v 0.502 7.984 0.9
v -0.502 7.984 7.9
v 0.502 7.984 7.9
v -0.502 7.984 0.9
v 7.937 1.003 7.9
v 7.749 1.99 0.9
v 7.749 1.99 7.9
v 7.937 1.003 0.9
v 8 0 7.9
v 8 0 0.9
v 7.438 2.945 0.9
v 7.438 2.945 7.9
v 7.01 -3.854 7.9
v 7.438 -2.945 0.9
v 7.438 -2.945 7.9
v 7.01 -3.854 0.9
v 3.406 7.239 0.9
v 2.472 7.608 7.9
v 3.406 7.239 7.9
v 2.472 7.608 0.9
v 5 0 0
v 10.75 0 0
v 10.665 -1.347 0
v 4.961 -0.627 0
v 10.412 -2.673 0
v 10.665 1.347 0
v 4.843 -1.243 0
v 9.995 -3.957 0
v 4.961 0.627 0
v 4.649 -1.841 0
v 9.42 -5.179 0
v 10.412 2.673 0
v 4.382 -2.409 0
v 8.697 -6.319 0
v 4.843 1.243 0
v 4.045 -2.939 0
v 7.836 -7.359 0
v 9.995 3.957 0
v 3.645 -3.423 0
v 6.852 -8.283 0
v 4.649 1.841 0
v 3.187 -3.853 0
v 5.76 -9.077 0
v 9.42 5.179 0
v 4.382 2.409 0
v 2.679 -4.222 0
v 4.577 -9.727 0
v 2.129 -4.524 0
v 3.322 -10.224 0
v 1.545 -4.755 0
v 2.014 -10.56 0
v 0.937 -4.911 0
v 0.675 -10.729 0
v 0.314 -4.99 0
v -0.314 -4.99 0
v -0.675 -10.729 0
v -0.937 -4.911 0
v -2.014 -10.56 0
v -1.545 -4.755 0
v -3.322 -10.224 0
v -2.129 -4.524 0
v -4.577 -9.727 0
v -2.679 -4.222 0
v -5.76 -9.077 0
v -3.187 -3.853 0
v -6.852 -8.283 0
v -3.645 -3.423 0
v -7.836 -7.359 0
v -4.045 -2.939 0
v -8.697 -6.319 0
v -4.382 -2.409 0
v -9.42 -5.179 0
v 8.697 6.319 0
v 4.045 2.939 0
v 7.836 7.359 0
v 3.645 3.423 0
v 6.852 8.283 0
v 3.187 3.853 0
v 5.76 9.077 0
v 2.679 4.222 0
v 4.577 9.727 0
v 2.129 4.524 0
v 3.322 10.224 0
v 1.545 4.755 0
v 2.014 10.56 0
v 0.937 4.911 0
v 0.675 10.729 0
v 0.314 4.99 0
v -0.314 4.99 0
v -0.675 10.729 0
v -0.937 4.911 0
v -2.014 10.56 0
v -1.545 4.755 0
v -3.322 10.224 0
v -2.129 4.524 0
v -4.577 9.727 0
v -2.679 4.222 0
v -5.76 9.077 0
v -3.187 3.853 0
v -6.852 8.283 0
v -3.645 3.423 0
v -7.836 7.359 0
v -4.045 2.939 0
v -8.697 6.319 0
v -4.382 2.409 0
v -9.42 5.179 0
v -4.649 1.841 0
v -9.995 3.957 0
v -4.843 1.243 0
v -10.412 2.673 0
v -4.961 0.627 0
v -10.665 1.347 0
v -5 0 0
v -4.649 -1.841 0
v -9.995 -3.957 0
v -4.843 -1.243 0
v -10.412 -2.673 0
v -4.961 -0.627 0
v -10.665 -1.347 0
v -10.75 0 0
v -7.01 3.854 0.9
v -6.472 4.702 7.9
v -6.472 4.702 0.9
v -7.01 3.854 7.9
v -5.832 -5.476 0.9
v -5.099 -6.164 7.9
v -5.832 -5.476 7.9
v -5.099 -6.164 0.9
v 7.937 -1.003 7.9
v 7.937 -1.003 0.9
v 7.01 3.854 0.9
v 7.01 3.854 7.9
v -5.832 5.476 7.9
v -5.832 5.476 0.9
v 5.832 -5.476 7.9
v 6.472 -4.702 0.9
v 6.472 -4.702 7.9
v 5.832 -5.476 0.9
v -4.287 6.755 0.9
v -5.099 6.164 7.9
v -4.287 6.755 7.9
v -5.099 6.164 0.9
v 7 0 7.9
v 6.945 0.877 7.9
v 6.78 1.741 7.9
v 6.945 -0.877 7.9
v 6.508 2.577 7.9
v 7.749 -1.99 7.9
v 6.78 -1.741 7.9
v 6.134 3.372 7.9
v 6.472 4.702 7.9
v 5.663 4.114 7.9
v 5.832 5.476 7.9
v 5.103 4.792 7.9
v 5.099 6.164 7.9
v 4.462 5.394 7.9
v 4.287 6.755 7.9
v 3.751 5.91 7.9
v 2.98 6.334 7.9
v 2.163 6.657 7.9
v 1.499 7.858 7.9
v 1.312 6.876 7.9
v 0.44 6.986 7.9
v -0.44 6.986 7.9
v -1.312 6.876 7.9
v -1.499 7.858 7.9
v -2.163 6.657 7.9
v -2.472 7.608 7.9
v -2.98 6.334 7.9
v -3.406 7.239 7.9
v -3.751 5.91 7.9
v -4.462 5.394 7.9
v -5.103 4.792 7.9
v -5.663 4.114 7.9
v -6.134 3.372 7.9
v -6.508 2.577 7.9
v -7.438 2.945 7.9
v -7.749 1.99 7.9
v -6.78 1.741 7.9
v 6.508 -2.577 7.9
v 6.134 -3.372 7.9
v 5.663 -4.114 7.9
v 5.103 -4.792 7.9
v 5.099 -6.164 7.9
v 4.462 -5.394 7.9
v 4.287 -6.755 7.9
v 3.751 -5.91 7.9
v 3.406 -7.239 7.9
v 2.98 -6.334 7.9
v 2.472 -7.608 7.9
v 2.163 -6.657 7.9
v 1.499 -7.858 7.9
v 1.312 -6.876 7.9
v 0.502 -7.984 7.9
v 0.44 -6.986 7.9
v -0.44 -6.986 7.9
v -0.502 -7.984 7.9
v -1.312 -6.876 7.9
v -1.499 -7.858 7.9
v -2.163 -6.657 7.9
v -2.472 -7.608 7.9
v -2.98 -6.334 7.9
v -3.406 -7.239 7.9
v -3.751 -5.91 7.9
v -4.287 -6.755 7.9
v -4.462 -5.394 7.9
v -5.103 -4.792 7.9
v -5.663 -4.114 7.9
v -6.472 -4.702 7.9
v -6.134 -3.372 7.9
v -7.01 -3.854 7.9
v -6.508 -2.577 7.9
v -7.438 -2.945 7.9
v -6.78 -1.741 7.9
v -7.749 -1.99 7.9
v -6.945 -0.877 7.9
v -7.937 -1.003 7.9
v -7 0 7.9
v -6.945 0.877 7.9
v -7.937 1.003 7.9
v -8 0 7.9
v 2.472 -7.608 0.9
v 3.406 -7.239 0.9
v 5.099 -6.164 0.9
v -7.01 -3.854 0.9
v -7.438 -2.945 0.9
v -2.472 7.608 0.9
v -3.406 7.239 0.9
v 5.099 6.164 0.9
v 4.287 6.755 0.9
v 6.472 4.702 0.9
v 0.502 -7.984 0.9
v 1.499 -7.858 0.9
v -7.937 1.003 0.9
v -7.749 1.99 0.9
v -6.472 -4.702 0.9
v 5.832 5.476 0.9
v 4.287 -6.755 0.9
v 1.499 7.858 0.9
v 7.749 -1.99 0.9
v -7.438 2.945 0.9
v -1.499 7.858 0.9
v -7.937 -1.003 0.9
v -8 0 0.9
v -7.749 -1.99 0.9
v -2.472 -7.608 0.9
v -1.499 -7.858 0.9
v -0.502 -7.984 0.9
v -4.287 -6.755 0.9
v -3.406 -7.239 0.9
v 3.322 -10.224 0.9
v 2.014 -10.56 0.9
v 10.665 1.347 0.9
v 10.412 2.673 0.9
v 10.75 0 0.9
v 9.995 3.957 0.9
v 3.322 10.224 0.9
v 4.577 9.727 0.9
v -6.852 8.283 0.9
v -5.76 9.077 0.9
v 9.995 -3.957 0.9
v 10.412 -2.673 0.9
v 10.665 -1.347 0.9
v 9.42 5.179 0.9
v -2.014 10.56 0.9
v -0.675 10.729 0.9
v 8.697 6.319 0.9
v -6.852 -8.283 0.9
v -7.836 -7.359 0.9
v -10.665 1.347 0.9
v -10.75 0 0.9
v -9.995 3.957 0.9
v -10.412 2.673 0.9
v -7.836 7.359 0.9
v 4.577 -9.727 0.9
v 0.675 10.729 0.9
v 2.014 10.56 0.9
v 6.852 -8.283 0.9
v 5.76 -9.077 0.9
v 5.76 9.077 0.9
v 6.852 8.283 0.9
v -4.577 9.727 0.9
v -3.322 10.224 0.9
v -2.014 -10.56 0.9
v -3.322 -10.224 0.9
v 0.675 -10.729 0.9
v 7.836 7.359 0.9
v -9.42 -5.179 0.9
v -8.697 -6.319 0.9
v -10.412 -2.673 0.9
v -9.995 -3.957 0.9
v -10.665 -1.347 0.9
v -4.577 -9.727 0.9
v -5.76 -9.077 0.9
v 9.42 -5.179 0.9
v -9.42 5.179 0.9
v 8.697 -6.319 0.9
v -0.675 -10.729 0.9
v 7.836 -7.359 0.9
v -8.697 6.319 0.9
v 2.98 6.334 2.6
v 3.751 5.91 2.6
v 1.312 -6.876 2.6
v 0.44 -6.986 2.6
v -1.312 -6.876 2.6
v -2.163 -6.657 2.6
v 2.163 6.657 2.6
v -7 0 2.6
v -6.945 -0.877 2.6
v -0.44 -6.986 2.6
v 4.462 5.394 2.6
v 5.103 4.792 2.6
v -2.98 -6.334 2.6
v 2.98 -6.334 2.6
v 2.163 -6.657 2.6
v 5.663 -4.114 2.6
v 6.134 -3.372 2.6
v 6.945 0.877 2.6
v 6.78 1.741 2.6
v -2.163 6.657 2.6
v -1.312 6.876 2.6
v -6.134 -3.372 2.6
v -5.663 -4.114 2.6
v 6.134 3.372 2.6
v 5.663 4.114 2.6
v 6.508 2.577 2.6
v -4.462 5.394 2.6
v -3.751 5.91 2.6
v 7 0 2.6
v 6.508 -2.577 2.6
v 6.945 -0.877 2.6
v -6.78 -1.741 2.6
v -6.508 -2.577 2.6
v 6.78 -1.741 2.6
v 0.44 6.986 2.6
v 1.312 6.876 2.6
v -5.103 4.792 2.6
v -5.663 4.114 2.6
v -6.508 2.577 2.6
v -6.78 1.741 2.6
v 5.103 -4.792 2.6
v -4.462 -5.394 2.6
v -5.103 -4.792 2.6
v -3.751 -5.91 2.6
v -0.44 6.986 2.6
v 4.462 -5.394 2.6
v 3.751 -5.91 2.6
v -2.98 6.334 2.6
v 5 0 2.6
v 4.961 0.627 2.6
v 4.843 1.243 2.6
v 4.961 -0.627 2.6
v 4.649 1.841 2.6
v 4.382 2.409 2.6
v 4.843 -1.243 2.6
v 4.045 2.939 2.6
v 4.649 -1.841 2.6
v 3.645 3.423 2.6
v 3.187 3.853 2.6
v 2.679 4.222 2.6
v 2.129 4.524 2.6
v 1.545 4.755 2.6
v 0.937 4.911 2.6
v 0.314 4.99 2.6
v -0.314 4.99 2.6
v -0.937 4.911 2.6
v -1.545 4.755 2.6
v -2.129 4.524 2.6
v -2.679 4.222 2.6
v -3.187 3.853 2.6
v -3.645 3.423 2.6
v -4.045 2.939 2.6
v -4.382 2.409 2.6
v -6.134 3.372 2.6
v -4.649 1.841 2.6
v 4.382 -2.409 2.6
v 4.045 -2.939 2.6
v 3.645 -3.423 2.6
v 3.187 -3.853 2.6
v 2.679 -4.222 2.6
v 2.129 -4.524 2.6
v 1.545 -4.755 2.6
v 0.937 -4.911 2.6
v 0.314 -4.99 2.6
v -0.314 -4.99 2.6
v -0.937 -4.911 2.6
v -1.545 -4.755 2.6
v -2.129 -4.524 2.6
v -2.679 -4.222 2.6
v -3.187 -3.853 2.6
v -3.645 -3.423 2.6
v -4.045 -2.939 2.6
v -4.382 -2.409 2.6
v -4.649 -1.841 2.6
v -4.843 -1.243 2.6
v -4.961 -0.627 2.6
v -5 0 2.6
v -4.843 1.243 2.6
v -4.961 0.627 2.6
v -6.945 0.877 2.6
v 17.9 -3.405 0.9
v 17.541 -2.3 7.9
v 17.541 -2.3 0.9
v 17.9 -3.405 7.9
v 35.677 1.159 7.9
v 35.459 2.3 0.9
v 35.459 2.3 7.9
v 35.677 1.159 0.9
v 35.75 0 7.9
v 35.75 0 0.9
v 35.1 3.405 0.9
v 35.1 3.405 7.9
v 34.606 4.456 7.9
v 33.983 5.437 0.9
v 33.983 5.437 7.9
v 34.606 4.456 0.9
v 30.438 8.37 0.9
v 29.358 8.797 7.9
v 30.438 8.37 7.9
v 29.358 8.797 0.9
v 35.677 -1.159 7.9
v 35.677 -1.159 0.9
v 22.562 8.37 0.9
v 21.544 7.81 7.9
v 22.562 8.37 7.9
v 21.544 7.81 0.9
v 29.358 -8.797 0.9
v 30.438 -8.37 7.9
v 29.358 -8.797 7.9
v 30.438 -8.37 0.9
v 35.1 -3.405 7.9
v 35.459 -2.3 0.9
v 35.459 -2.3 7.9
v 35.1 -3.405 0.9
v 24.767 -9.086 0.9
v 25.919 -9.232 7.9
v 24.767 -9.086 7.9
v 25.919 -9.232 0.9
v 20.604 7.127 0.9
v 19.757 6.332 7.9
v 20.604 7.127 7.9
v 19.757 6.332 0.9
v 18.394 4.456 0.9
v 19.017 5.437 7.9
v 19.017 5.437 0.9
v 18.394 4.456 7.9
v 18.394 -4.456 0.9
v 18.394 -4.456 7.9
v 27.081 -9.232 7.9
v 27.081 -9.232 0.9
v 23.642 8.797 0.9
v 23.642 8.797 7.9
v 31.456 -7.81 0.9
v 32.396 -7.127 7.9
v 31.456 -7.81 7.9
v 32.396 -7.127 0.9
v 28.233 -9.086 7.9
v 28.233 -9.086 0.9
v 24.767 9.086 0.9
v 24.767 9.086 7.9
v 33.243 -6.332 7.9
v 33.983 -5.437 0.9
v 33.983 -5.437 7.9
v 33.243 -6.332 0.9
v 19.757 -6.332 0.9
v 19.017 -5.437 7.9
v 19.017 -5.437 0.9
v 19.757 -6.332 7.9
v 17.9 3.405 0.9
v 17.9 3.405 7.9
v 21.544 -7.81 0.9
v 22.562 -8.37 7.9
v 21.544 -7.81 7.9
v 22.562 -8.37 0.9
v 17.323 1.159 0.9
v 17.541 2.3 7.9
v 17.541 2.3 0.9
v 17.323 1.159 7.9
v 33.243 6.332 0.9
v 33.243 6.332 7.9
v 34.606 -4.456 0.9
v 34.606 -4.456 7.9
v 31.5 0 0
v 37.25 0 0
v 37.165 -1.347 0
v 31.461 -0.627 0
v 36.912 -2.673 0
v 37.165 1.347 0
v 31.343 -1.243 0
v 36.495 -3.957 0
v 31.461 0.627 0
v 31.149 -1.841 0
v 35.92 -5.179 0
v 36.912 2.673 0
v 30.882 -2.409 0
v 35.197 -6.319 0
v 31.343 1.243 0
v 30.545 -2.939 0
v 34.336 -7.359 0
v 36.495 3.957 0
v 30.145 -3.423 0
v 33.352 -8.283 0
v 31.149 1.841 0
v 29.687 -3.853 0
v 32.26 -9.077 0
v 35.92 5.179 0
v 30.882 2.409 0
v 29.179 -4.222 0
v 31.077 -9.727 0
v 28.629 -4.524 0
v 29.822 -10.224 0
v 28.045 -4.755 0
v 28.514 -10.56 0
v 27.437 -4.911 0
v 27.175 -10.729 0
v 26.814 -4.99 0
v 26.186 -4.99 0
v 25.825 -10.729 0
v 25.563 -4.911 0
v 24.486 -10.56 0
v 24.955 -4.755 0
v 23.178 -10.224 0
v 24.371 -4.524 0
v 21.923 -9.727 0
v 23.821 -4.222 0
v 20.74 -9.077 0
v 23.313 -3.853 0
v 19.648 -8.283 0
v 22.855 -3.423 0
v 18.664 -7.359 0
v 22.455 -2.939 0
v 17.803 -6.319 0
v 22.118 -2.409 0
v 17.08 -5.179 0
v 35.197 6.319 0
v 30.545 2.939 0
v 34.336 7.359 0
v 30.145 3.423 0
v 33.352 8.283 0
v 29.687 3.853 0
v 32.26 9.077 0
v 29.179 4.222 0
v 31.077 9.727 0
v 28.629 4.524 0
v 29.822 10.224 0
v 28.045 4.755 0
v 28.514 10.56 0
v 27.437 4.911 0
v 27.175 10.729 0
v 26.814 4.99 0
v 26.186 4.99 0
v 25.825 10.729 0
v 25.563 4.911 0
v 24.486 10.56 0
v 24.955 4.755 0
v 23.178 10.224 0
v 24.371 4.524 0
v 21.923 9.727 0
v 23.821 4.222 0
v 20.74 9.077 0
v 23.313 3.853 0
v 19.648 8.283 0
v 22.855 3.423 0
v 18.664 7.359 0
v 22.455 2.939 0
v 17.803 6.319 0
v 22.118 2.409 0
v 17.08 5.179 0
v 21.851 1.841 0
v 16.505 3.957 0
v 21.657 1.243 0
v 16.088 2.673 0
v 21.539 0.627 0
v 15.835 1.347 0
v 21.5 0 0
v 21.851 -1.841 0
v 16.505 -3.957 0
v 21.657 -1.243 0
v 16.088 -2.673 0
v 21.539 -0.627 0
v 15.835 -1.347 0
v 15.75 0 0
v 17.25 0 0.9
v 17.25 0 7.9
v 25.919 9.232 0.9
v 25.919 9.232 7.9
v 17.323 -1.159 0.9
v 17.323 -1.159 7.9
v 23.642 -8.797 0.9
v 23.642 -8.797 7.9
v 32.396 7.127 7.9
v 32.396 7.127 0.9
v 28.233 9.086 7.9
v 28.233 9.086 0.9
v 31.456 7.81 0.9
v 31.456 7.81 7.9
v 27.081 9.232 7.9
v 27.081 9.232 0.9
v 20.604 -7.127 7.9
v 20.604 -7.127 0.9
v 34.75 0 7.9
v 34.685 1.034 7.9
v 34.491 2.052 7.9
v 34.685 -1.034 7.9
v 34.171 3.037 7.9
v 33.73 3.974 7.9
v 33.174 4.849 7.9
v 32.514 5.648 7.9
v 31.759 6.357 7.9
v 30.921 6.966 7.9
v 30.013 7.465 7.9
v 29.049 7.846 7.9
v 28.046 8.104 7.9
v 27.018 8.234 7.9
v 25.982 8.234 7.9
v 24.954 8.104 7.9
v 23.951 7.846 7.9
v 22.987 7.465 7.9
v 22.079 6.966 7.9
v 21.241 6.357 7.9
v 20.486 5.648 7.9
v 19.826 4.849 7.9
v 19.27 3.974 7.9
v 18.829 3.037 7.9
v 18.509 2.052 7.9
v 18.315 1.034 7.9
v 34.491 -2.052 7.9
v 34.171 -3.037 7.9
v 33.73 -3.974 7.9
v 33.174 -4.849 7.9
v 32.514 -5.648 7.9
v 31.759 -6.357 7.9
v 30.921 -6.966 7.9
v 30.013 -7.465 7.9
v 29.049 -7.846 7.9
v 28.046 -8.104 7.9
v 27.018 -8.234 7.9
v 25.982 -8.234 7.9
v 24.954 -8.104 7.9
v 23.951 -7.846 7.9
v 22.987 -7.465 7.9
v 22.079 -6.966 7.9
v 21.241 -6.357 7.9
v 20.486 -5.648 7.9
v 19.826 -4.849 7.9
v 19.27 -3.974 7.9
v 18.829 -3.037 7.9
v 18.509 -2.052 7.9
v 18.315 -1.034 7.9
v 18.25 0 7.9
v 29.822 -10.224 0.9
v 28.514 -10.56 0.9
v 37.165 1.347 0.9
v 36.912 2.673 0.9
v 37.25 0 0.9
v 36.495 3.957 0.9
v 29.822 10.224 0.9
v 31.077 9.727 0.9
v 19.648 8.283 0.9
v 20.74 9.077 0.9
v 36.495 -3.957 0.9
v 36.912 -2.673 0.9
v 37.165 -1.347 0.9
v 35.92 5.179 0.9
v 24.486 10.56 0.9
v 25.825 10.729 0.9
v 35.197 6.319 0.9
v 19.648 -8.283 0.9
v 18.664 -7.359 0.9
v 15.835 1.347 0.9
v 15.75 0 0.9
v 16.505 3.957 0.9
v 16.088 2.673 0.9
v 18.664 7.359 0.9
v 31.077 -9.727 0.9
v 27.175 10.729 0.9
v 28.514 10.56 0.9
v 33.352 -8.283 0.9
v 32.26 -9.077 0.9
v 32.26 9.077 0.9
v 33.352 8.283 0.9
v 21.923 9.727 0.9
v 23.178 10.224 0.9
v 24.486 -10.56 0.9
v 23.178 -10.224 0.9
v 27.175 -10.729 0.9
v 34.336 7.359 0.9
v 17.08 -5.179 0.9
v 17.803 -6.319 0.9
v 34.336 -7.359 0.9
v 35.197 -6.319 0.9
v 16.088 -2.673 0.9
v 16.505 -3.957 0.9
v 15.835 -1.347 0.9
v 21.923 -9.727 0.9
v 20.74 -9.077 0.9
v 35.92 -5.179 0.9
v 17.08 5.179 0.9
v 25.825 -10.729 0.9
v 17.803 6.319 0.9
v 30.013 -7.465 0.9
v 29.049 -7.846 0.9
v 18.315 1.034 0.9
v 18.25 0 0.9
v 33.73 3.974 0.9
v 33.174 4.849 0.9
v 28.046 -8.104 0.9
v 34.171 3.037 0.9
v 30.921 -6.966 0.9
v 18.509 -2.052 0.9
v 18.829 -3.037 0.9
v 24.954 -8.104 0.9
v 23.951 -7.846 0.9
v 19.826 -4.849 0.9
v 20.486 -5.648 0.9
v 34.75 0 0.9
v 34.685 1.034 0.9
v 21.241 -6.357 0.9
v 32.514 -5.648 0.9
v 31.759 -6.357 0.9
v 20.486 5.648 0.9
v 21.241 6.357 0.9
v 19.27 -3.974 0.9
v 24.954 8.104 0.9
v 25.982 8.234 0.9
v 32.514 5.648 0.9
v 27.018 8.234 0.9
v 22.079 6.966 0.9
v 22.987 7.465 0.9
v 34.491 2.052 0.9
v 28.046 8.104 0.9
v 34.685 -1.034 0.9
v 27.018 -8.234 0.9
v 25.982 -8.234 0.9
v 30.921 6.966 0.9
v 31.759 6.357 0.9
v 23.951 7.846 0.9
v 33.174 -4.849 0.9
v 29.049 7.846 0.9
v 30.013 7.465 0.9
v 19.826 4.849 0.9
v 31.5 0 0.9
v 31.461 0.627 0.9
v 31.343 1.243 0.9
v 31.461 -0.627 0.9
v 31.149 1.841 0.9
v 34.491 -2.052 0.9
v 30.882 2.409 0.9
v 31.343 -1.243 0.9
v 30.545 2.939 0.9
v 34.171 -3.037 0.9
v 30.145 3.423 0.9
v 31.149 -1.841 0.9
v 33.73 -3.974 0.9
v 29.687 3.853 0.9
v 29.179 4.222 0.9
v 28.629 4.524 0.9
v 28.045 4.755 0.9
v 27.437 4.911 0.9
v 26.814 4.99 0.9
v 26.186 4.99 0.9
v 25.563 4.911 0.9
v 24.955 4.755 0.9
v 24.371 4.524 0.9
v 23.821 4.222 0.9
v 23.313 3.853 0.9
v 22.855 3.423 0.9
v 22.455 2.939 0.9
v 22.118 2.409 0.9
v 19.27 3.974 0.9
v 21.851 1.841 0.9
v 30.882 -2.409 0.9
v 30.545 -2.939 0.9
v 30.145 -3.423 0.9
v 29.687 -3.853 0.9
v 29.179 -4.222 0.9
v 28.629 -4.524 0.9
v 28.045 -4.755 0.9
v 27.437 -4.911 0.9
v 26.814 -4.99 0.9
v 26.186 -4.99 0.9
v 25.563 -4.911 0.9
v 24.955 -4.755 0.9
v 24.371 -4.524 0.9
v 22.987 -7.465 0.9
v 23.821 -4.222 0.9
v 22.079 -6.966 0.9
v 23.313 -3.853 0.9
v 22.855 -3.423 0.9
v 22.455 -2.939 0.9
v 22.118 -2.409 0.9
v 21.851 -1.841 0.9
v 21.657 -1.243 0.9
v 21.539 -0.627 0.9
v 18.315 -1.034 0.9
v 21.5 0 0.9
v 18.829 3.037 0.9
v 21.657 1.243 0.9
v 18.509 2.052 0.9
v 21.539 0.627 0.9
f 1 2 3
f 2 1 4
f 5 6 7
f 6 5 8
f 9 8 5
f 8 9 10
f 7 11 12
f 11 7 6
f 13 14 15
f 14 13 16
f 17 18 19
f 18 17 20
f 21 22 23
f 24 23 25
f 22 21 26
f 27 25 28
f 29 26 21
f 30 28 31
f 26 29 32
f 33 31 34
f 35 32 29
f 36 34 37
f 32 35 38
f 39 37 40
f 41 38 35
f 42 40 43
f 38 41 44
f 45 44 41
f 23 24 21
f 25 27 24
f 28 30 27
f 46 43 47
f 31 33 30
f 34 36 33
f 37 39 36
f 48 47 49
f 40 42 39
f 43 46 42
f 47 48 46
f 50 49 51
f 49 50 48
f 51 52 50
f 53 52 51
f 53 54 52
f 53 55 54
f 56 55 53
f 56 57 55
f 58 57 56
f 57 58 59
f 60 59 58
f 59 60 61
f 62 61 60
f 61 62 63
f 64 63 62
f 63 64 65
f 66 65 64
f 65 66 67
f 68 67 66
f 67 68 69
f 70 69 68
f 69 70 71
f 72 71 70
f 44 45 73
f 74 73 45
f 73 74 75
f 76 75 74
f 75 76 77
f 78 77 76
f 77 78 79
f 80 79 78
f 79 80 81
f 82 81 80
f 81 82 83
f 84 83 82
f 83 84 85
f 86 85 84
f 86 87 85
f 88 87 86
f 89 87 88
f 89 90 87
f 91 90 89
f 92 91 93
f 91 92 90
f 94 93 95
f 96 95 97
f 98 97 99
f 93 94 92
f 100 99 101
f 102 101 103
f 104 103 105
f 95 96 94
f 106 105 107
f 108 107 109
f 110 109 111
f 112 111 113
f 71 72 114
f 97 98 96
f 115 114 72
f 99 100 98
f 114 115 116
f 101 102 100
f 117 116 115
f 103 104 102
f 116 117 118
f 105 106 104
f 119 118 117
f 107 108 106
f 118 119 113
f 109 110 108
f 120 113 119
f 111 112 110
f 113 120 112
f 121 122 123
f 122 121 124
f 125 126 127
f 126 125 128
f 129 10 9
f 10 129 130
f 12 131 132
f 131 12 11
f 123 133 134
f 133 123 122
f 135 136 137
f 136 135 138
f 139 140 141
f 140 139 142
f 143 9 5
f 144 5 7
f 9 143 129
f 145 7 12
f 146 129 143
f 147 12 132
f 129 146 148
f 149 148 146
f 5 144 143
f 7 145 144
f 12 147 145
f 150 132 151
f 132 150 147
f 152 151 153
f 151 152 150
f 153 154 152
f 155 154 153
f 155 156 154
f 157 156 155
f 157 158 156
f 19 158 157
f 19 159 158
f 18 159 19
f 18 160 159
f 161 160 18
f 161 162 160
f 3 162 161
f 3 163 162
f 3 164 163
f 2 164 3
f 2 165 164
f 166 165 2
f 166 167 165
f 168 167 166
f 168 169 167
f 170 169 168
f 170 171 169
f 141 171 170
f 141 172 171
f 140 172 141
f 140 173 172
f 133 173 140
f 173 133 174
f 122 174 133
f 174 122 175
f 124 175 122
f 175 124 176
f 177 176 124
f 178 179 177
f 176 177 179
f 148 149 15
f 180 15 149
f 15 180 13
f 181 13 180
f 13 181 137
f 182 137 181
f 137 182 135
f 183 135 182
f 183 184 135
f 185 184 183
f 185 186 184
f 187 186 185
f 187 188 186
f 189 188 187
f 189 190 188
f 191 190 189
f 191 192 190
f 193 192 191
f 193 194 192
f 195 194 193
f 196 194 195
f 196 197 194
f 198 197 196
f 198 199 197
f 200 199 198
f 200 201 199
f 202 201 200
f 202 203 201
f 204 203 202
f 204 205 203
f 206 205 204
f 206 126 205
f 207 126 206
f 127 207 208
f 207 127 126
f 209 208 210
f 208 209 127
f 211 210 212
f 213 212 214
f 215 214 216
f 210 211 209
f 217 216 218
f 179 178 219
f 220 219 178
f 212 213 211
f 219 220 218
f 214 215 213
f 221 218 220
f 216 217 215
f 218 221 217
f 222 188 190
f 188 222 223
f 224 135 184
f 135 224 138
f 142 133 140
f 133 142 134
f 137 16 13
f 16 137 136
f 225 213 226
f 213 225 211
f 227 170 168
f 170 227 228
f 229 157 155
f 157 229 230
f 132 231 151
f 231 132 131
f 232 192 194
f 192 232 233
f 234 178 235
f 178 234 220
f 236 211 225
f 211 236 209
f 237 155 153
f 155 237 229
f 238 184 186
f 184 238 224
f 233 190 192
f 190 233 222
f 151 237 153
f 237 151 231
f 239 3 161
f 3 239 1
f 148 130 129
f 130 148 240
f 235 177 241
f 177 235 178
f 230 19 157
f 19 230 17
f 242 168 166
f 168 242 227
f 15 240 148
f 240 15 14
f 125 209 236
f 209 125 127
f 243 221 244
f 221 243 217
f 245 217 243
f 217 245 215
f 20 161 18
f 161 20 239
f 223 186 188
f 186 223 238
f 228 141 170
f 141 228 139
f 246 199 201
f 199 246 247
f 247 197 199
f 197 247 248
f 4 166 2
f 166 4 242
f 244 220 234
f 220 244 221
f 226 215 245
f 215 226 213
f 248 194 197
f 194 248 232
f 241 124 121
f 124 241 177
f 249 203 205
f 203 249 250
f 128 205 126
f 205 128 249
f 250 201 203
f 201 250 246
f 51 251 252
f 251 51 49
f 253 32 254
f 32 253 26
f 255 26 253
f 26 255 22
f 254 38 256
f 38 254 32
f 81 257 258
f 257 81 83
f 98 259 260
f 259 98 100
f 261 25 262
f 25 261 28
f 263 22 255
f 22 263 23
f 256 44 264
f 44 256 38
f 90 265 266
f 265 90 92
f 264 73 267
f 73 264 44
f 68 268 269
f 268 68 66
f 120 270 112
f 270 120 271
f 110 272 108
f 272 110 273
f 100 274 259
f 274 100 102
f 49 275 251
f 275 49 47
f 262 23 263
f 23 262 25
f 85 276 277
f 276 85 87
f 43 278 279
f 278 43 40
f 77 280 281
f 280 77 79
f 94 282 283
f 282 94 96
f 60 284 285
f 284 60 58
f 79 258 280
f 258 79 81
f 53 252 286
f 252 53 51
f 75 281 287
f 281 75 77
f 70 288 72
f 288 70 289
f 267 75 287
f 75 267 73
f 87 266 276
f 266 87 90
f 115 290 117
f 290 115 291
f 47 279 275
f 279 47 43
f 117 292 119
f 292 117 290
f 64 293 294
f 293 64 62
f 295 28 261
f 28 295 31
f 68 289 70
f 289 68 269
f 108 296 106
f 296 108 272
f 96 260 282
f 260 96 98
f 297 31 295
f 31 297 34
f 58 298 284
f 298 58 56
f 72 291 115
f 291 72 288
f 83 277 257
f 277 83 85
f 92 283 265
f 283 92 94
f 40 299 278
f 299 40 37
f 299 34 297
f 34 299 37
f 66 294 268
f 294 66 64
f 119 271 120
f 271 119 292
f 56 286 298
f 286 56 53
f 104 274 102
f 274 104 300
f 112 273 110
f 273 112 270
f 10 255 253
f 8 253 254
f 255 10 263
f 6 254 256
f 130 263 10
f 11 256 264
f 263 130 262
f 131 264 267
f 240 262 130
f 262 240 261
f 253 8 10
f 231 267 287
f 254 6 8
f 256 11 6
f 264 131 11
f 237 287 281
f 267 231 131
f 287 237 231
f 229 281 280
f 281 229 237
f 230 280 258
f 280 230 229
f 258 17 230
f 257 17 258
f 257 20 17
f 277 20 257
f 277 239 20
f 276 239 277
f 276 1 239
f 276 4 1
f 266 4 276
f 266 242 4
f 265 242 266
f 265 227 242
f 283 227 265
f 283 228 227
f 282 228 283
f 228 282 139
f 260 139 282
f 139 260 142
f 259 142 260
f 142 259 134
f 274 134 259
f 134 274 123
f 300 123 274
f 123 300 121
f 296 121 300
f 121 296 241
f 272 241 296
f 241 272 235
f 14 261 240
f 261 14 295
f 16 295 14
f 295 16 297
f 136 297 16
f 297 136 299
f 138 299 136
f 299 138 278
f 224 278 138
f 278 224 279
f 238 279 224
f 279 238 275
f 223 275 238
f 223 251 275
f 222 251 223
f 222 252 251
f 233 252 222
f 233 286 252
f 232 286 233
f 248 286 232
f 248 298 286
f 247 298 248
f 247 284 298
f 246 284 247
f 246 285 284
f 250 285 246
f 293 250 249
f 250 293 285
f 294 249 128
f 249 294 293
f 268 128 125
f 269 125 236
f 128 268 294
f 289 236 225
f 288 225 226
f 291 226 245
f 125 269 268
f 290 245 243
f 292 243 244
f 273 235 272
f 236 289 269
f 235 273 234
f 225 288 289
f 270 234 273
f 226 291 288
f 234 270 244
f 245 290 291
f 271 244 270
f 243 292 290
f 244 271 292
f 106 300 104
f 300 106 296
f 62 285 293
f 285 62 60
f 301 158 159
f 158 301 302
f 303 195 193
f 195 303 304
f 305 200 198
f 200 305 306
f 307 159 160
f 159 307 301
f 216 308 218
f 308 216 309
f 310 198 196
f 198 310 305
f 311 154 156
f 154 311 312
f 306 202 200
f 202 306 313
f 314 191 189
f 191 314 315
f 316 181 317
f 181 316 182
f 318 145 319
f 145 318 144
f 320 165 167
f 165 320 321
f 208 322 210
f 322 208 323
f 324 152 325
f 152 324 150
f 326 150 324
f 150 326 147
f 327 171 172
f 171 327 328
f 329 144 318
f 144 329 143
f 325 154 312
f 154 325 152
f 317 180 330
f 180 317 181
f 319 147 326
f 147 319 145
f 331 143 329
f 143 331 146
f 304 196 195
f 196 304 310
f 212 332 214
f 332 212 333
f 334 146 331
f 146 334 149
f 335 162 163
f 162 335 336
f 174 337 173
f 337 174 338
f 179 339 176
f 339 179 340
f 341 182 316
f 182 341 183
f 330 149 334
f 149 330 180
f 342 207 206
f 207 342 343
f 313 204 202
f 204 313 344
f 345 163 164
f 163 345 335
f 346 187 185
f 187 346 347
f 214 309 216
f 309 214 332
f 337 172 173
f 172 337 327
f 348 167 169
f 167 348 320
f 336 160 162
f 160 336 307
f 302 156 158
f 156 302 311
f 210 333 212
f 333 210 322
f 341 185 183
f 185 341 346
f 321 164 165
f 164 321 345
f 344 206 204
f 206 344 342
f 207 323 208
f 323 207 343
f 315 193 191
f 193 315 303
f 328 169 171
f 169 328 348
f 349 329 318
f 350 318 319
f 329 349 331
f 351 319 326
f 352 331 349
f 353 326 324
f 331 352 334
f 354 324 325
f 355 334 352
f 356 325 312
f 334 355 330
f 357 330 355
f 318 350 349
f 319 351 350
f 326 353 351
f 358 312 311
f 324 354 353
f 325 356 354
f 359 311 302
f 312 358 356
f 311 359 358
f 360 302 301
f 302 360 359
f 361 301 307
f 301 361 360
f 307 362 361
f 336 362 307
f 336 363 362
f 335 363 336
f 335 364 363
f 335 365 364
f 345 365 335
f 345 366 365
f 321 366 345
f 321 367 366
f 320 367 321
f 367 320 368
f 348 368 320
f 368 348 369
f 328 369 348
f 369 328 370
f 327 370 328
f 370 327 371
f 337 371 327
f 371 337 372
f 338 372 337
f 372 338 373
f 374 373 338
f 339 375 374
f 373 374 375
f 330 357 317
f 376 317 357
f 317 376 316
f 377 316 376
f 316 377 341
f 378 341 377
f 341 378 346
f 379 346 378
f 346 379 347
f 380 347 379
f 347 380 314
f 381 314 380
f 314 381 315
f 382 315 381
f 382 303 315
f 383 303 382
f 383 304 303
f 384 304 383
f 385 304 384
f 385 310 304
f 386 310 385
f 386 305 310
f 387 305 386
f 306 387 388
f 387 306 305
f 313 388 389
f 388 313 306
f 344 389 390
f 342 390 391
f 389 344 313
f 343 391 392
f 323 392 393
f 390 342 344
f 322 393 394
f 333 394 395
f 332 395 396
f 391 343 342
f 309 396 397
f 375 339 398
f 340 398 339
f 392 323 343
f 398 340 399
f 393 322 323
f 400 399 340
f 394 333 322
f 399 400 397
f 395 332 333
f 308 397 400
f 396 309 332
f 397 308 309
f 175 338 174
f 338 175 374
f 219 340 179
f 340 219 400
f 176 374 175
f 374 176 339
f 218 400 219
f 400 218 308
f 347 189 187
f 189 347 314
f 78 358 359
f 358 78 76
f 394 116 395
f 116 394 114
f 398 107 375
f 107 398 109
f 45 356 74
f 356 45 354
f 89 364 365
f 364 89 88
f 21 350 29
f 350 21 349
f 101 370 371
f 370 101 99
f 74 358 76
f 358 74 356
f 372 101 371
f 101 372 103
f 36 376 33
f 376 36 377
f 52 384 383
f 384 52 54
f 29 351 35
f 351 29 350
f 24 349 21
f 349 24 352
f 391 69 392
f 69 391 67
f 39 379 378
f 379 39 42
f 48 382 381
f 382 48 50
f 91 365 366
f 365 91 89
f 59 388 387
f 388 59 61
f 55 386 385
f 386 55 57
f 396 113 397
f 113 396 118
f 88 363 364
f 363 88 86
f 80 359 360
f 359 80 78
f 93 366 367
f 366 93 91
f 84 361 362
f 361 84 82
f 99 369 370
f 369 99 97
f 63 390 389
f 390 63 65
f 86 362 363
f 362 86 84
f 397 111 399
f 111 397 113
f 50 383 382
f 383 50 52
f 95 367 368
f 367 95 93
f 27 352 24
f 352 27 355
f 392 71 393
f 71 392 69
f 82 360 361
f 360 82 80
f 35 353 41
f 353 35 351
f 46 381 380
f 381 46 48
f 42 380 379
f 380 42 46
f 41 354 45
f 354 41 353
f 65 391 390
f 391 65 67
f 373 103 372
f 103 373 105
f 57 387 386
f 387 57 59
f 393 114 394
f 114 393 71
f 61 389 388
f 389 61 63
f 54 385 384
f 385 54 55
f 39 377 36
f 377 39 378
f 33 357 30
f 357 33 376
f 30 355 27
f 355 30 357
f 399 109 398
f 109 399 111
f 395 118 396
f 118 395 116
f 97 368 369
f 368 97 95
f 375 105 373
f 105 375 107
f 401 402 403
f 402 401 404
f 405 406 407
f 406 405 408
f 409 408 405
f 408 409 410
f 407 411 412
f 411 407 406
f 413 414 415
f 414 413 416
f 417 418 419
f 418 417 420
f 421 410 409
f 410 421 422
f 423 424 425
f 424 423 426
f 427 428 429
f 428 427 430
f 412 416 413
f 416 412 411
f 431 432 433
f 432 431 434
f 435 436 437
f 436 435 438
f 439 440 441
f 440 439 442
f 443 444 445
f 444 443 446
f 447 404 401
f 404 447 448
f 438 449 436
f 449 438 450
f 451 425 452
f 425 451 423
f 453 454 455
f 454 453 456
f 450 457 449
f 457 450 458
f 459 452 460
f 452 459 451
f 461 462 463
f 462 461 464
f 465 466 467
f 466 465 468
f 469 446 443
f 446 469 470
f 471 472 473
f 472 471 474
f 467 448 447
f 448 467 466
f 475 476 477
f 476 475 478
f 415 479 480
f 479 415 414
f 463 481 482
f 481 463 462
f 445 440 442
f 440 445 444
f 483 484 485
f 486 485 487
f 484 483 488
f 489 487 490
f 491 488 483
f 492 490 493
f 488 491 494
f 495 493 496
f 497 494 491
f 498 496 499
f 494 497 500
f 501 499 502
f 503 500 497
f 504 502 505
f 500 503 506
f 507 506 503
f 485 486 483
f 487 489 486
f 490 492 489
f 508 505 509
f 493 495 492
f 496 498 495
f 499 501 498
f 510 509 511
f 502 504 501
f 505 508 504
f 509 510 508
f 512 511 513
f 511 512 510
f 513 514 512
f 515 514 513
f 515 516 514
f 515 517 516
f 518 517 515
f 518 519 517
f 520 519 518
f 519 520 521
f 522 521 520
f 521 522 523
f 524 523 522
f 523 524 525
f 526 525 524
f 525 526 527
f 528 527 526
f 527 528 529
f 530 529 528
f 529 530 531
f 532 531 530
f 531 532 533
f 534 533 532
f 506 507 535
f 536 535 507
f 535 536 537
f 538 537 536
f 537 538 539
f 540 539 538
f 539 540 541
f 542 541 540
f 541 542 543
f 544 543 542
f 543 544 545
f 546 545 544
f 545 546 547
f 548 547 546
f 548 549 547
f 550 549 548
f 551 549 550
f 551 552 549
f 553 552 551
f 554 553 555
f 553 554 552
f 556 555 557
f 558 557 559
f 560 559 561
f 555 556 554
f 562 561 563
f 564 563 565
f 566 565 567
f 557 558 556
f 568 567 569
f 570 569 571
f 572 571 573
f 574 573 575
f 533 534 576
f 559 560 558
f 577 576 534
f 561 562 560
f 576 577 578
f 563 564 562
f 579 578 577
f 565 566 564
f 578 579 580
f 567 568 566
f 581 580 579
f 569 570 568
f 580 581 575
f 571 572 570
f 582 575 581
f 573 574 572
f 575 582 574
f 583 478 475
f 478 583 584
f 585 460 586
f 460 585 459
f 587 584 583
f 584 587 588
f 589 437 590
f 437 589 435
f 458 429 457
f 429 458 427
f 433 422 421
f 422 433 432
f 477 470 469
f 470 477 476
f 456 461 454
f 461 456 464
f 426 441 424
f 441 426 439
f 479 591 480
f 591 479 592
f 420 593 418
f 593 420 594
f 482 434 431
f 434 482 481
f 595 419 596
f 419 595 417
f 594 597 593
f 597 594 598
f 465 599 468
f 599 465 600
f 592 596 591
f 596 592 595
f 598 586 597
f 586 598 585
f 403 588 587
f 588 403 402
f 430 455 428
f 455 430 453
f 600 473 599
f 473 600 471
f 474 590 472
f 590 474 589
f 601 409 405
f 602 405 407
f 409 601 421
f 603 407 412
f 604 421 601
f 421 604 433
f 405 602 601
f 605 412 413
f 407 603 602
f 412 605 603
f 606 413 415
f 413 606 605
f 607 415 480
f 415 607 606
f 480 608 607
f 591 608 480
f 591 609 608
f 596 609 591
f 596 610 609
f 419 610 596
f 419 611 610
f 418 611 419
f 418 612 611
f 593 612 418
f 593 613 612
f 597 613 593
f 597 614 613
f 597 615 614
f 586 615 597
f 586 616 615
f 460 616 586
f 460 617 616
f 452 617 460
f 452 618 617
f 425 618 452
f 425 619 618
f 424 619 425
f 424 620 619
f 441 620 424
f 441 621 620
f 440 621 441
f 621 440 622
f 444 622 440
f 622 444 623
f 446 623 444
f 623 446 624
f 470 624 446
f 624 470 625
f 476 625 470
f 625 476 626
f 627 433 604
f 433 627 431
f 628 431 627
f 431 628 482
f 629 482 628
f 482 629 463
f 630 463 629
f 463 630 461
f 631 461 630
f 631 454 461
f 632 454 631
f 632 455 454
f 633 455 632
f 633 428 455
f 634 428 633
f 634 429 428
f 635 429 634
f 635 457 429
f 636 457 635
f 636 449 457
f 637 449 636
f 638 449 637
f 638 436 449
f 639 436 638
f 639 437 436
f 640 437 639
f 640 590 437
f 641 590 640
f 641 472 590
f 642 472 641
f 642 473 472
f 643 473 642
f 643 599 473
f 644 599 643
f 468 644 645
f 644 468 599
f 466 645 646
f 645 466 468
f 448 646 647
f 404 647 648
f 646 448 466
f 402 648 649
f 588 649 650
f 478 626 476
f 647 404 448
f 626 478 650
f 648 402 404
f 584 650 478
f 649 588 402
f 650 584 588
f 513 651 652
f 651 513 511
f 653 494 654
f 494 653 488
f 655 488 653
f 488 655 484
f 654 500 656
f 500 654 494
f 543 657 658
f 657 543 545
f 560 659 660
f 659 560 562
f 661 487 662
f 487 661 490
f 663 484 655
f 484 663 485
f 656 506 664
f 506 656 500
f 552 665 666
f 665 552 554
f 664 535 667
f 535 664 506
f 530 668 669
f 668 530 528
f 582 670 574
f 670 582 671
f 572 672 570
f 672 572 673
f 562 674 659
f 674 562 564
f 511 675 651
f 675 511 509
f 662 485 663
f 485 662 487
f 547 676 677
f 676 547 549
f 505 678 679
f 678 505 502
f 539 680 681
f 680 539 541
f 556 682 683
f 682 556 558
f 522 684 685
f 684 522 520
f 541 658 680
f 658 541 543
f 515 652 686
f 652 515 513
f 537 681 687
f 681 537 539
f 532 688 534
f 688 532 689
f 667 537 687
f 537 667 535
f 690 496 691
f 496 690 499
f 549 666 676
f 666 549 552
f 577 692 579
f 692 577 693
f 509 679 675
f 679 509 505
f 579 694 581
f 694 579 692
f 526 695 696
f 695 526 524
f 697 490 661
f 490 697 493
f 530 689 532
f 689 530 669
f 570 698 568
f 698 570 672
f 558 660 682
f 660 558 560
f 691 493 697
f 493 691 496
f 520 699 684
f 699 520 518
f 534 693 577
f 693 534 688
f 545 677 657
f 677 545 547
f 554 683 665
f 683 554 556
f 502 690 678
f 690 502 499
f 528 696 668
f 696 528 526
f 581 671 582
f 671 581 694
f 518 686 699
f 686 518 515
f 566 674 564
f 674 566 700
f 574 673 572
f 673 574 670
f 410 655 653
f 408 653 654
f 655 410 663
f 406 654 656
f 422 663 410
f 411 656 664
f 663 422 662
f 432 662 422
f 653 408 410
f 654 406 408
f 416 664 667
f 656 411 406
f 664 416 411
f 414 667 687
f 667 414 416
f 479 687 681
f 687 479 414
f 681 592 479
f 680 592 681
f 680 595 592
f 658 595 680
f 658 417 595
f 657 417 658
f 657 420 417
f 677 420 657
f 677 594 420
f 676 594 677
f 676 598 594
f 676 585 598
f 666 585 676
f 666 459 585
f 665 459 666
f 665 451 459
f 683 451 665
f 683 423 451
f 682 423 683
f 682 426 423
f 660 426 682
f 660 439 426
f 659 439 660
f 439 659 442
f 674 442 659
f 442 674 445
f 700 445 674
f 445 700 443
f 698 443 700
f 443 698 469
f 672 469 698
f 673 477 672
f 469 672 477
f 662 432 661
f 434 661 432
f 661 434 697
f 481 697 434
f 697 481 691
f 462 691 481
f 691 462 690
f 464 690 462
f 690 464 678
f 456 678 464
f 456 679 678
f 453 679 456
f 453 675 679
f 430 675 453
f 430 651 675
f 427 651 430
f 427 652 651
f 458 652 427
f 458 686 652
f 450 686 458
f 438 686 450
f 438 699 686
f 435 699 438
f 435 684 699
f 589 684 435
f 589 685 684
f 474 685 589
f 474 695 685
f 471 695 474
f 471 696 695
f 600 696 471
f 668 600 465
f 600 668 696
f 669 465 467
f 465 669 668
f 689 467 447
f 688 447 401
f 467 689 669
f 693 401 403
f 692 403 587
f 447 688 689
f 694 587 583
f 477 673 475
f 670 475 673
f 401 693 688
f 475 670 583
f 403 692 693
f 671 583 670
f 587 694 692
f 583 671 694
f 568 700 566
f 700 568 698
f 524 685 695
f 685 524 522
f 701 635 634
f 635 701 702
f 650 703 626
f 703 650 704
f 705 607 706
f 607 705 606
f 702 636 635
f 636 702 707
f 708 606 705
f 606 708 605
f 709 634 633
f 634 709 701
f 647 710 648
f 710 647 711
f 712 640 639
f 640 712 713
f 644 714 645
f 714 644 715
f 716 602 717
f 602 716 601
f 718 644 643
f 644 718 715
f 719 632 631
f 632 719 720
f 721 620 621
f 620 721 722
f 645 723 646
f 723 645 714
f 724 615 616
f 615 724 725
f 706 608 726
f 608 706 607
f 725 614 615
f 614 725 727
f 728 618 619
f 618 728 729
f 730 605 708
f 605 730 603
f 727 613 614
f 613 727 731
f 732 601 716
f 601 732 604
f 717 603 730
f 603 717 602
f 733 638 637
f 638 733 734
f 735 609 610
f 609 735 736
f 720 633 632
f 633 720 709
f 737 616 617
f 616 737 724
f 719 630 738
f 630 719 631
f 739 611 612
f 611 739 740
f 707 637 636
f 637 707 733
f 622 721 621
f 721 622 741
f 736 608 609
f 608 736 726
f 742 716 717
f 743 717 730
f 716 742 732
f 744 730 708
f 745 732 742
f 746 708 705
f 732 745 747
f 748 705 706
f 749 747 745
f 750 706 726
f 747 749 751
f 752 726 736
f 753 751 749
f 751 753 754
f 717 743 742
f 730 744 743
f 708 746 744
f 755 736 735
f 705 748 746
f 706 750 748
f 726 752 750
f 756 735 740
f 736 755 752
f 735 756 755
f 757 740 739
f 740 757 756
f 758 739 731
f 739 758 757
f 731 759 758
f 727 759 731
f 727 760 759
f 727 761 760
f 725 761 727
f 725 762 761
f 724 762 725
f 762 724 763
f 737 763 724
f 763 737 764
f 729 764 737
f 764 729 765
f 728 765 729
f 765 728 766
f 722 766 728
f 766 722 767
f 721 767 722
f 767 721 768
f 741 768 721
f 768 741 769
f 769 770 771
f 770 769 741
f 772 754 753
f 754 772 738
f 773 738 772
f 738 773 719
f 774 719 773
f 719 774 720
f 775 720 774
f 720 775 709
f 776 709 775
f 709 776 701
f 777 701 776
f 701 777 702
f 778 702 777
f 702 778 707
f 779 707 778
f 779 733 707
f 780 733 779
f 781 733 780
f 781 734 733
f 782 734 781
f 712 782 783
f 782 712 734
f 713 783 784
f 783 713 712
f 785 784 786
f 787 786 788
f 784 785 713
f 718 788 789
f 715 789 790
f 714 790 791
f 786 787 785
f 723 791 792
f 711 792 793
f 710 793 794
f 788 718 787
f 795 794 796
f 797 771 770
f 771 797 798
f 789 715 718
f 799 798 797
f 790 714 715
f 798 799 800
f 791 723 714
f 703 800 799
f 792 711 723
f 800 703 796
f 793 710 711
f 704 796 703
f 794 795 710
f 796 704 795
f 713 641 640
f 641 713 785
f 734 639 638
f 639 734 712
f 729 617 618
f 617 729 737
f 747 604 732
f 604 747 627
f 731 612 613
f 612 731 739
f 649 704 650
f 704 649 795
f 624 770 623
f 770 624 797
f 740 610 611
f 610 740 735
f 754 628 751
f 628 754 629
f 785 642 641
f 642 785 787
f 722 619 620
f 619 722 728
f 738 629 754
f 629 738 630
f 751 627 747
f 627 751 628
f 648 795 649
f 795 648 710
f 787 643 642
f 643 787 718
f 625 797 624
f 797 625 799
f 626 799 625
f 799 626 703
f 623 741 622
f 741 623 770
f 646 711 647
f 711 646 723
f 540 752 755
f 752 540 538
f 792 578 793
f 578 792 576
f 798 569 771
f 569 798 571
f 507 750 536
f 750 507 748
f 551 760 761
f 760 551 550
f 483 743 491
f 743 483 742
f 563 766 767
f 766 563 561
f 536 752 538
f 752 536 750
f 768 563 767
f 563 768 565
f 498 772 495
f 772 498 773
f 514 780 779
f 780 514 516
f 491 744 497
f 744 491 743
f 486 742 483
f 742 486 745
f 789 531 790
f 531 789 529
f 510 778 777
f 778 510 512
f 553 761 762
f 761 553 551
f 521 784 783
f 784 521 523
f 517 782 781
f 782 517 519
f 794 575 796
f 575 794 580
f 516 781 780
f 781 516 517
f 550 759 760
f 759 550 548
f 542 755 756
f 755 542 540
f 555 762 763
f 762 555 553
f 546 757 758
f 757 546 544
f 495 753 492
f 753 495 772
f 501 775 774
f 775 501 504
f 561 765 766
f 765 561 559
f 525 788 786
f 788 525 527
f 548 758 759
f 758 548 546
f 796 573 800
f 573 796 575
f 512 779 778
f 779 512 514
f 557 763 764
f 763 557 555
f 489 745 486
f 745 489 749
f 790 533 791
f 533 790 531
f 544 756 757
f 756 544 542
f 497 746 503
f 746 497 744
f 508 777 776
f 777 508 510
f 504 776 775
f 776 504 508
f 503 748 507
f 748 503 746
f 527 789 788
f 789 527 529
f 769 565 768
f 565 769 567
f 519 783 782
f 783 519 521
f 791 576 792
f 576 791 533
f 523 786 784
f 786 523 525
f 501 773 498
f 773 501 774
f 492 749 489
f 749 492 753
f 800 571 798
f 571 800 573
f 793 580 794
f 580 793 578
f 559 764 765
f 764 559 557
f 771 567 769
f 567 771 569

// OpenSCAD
//
// Parametric sleeve-style belt guide for 624, 623 bearings and their ilk.
// mrice

layer_height = 0.3;
hotend_width = 0.5;

wall= hotend_width*3;
clearence= hotend_width/2; 

// for 624 bearings:
bearing_d        = 13;
bearing_h        = 5;
bearing_inside_d = 4;
belt_w           = 7;

// for 623 bearings:
//bearing_d = 10;
//bearing_h = 4;
//bearing_inside_d = 3; // hole diameter of the bearing

//guide_outer_d = bearing_d + 12;
flange_h = 3*layer_height;
//flange_d = 21;

hole_for_inner = bearing_d/2+(2*clearence);
r_for_inner = hole_for_inner + (2*hotend_width);
hole_for_outer = r_for_inner+clearence;
r_for_outer = hole_for_outer + (hotend_width*2);

flange_d = 2*r_for_outer + (6*hotend_width);

module belt_guide_base(a) {
 if(a) {
    cylinder(r=r_for_outer, h=belt_w+flange_h, $fn=50);
 }
 else {
    cylinder(r=r_for_inner, h=belt_w+flange_h, $fn=50);
 }
 // outer flange
 cylinder(r=flange_d/2, h=flange_h, $fn=50);
}

module belt_guide_holes(a){
 // hole for the bearing:
 if(a) {
     #translate([0,0,flange_h+(1-a)*(belt_w-bearing_h-layer_height)]) cylinder(r=hole_for_outer, h=bearing_h+10, $fn=50);
 }
 else {
     #translate([0,0,flange_h+(1-a)*(belt_w-bearing_h-layer_height)]) cylinder(r=hole_for_inner, h=bearing_h+10, $fn=50);
 }
 // hole for the rod through:
 translate([0,0,-1]) cylinder(r=bearing_d/2-wall, h=10, $fn=50);
}

// Final part
module belt_guide(){
 difference(){
  belt_guide_base(0);
  belt_guide_holes(0);
 }
}

module belt_guide_sleeve() {
 difference(){
  belt_guide_base(1);
  belt_guide_holes(1);
 }
}

belt_guide();

translate([flange_d+5,0,0]) belt_guide_sleeve();
